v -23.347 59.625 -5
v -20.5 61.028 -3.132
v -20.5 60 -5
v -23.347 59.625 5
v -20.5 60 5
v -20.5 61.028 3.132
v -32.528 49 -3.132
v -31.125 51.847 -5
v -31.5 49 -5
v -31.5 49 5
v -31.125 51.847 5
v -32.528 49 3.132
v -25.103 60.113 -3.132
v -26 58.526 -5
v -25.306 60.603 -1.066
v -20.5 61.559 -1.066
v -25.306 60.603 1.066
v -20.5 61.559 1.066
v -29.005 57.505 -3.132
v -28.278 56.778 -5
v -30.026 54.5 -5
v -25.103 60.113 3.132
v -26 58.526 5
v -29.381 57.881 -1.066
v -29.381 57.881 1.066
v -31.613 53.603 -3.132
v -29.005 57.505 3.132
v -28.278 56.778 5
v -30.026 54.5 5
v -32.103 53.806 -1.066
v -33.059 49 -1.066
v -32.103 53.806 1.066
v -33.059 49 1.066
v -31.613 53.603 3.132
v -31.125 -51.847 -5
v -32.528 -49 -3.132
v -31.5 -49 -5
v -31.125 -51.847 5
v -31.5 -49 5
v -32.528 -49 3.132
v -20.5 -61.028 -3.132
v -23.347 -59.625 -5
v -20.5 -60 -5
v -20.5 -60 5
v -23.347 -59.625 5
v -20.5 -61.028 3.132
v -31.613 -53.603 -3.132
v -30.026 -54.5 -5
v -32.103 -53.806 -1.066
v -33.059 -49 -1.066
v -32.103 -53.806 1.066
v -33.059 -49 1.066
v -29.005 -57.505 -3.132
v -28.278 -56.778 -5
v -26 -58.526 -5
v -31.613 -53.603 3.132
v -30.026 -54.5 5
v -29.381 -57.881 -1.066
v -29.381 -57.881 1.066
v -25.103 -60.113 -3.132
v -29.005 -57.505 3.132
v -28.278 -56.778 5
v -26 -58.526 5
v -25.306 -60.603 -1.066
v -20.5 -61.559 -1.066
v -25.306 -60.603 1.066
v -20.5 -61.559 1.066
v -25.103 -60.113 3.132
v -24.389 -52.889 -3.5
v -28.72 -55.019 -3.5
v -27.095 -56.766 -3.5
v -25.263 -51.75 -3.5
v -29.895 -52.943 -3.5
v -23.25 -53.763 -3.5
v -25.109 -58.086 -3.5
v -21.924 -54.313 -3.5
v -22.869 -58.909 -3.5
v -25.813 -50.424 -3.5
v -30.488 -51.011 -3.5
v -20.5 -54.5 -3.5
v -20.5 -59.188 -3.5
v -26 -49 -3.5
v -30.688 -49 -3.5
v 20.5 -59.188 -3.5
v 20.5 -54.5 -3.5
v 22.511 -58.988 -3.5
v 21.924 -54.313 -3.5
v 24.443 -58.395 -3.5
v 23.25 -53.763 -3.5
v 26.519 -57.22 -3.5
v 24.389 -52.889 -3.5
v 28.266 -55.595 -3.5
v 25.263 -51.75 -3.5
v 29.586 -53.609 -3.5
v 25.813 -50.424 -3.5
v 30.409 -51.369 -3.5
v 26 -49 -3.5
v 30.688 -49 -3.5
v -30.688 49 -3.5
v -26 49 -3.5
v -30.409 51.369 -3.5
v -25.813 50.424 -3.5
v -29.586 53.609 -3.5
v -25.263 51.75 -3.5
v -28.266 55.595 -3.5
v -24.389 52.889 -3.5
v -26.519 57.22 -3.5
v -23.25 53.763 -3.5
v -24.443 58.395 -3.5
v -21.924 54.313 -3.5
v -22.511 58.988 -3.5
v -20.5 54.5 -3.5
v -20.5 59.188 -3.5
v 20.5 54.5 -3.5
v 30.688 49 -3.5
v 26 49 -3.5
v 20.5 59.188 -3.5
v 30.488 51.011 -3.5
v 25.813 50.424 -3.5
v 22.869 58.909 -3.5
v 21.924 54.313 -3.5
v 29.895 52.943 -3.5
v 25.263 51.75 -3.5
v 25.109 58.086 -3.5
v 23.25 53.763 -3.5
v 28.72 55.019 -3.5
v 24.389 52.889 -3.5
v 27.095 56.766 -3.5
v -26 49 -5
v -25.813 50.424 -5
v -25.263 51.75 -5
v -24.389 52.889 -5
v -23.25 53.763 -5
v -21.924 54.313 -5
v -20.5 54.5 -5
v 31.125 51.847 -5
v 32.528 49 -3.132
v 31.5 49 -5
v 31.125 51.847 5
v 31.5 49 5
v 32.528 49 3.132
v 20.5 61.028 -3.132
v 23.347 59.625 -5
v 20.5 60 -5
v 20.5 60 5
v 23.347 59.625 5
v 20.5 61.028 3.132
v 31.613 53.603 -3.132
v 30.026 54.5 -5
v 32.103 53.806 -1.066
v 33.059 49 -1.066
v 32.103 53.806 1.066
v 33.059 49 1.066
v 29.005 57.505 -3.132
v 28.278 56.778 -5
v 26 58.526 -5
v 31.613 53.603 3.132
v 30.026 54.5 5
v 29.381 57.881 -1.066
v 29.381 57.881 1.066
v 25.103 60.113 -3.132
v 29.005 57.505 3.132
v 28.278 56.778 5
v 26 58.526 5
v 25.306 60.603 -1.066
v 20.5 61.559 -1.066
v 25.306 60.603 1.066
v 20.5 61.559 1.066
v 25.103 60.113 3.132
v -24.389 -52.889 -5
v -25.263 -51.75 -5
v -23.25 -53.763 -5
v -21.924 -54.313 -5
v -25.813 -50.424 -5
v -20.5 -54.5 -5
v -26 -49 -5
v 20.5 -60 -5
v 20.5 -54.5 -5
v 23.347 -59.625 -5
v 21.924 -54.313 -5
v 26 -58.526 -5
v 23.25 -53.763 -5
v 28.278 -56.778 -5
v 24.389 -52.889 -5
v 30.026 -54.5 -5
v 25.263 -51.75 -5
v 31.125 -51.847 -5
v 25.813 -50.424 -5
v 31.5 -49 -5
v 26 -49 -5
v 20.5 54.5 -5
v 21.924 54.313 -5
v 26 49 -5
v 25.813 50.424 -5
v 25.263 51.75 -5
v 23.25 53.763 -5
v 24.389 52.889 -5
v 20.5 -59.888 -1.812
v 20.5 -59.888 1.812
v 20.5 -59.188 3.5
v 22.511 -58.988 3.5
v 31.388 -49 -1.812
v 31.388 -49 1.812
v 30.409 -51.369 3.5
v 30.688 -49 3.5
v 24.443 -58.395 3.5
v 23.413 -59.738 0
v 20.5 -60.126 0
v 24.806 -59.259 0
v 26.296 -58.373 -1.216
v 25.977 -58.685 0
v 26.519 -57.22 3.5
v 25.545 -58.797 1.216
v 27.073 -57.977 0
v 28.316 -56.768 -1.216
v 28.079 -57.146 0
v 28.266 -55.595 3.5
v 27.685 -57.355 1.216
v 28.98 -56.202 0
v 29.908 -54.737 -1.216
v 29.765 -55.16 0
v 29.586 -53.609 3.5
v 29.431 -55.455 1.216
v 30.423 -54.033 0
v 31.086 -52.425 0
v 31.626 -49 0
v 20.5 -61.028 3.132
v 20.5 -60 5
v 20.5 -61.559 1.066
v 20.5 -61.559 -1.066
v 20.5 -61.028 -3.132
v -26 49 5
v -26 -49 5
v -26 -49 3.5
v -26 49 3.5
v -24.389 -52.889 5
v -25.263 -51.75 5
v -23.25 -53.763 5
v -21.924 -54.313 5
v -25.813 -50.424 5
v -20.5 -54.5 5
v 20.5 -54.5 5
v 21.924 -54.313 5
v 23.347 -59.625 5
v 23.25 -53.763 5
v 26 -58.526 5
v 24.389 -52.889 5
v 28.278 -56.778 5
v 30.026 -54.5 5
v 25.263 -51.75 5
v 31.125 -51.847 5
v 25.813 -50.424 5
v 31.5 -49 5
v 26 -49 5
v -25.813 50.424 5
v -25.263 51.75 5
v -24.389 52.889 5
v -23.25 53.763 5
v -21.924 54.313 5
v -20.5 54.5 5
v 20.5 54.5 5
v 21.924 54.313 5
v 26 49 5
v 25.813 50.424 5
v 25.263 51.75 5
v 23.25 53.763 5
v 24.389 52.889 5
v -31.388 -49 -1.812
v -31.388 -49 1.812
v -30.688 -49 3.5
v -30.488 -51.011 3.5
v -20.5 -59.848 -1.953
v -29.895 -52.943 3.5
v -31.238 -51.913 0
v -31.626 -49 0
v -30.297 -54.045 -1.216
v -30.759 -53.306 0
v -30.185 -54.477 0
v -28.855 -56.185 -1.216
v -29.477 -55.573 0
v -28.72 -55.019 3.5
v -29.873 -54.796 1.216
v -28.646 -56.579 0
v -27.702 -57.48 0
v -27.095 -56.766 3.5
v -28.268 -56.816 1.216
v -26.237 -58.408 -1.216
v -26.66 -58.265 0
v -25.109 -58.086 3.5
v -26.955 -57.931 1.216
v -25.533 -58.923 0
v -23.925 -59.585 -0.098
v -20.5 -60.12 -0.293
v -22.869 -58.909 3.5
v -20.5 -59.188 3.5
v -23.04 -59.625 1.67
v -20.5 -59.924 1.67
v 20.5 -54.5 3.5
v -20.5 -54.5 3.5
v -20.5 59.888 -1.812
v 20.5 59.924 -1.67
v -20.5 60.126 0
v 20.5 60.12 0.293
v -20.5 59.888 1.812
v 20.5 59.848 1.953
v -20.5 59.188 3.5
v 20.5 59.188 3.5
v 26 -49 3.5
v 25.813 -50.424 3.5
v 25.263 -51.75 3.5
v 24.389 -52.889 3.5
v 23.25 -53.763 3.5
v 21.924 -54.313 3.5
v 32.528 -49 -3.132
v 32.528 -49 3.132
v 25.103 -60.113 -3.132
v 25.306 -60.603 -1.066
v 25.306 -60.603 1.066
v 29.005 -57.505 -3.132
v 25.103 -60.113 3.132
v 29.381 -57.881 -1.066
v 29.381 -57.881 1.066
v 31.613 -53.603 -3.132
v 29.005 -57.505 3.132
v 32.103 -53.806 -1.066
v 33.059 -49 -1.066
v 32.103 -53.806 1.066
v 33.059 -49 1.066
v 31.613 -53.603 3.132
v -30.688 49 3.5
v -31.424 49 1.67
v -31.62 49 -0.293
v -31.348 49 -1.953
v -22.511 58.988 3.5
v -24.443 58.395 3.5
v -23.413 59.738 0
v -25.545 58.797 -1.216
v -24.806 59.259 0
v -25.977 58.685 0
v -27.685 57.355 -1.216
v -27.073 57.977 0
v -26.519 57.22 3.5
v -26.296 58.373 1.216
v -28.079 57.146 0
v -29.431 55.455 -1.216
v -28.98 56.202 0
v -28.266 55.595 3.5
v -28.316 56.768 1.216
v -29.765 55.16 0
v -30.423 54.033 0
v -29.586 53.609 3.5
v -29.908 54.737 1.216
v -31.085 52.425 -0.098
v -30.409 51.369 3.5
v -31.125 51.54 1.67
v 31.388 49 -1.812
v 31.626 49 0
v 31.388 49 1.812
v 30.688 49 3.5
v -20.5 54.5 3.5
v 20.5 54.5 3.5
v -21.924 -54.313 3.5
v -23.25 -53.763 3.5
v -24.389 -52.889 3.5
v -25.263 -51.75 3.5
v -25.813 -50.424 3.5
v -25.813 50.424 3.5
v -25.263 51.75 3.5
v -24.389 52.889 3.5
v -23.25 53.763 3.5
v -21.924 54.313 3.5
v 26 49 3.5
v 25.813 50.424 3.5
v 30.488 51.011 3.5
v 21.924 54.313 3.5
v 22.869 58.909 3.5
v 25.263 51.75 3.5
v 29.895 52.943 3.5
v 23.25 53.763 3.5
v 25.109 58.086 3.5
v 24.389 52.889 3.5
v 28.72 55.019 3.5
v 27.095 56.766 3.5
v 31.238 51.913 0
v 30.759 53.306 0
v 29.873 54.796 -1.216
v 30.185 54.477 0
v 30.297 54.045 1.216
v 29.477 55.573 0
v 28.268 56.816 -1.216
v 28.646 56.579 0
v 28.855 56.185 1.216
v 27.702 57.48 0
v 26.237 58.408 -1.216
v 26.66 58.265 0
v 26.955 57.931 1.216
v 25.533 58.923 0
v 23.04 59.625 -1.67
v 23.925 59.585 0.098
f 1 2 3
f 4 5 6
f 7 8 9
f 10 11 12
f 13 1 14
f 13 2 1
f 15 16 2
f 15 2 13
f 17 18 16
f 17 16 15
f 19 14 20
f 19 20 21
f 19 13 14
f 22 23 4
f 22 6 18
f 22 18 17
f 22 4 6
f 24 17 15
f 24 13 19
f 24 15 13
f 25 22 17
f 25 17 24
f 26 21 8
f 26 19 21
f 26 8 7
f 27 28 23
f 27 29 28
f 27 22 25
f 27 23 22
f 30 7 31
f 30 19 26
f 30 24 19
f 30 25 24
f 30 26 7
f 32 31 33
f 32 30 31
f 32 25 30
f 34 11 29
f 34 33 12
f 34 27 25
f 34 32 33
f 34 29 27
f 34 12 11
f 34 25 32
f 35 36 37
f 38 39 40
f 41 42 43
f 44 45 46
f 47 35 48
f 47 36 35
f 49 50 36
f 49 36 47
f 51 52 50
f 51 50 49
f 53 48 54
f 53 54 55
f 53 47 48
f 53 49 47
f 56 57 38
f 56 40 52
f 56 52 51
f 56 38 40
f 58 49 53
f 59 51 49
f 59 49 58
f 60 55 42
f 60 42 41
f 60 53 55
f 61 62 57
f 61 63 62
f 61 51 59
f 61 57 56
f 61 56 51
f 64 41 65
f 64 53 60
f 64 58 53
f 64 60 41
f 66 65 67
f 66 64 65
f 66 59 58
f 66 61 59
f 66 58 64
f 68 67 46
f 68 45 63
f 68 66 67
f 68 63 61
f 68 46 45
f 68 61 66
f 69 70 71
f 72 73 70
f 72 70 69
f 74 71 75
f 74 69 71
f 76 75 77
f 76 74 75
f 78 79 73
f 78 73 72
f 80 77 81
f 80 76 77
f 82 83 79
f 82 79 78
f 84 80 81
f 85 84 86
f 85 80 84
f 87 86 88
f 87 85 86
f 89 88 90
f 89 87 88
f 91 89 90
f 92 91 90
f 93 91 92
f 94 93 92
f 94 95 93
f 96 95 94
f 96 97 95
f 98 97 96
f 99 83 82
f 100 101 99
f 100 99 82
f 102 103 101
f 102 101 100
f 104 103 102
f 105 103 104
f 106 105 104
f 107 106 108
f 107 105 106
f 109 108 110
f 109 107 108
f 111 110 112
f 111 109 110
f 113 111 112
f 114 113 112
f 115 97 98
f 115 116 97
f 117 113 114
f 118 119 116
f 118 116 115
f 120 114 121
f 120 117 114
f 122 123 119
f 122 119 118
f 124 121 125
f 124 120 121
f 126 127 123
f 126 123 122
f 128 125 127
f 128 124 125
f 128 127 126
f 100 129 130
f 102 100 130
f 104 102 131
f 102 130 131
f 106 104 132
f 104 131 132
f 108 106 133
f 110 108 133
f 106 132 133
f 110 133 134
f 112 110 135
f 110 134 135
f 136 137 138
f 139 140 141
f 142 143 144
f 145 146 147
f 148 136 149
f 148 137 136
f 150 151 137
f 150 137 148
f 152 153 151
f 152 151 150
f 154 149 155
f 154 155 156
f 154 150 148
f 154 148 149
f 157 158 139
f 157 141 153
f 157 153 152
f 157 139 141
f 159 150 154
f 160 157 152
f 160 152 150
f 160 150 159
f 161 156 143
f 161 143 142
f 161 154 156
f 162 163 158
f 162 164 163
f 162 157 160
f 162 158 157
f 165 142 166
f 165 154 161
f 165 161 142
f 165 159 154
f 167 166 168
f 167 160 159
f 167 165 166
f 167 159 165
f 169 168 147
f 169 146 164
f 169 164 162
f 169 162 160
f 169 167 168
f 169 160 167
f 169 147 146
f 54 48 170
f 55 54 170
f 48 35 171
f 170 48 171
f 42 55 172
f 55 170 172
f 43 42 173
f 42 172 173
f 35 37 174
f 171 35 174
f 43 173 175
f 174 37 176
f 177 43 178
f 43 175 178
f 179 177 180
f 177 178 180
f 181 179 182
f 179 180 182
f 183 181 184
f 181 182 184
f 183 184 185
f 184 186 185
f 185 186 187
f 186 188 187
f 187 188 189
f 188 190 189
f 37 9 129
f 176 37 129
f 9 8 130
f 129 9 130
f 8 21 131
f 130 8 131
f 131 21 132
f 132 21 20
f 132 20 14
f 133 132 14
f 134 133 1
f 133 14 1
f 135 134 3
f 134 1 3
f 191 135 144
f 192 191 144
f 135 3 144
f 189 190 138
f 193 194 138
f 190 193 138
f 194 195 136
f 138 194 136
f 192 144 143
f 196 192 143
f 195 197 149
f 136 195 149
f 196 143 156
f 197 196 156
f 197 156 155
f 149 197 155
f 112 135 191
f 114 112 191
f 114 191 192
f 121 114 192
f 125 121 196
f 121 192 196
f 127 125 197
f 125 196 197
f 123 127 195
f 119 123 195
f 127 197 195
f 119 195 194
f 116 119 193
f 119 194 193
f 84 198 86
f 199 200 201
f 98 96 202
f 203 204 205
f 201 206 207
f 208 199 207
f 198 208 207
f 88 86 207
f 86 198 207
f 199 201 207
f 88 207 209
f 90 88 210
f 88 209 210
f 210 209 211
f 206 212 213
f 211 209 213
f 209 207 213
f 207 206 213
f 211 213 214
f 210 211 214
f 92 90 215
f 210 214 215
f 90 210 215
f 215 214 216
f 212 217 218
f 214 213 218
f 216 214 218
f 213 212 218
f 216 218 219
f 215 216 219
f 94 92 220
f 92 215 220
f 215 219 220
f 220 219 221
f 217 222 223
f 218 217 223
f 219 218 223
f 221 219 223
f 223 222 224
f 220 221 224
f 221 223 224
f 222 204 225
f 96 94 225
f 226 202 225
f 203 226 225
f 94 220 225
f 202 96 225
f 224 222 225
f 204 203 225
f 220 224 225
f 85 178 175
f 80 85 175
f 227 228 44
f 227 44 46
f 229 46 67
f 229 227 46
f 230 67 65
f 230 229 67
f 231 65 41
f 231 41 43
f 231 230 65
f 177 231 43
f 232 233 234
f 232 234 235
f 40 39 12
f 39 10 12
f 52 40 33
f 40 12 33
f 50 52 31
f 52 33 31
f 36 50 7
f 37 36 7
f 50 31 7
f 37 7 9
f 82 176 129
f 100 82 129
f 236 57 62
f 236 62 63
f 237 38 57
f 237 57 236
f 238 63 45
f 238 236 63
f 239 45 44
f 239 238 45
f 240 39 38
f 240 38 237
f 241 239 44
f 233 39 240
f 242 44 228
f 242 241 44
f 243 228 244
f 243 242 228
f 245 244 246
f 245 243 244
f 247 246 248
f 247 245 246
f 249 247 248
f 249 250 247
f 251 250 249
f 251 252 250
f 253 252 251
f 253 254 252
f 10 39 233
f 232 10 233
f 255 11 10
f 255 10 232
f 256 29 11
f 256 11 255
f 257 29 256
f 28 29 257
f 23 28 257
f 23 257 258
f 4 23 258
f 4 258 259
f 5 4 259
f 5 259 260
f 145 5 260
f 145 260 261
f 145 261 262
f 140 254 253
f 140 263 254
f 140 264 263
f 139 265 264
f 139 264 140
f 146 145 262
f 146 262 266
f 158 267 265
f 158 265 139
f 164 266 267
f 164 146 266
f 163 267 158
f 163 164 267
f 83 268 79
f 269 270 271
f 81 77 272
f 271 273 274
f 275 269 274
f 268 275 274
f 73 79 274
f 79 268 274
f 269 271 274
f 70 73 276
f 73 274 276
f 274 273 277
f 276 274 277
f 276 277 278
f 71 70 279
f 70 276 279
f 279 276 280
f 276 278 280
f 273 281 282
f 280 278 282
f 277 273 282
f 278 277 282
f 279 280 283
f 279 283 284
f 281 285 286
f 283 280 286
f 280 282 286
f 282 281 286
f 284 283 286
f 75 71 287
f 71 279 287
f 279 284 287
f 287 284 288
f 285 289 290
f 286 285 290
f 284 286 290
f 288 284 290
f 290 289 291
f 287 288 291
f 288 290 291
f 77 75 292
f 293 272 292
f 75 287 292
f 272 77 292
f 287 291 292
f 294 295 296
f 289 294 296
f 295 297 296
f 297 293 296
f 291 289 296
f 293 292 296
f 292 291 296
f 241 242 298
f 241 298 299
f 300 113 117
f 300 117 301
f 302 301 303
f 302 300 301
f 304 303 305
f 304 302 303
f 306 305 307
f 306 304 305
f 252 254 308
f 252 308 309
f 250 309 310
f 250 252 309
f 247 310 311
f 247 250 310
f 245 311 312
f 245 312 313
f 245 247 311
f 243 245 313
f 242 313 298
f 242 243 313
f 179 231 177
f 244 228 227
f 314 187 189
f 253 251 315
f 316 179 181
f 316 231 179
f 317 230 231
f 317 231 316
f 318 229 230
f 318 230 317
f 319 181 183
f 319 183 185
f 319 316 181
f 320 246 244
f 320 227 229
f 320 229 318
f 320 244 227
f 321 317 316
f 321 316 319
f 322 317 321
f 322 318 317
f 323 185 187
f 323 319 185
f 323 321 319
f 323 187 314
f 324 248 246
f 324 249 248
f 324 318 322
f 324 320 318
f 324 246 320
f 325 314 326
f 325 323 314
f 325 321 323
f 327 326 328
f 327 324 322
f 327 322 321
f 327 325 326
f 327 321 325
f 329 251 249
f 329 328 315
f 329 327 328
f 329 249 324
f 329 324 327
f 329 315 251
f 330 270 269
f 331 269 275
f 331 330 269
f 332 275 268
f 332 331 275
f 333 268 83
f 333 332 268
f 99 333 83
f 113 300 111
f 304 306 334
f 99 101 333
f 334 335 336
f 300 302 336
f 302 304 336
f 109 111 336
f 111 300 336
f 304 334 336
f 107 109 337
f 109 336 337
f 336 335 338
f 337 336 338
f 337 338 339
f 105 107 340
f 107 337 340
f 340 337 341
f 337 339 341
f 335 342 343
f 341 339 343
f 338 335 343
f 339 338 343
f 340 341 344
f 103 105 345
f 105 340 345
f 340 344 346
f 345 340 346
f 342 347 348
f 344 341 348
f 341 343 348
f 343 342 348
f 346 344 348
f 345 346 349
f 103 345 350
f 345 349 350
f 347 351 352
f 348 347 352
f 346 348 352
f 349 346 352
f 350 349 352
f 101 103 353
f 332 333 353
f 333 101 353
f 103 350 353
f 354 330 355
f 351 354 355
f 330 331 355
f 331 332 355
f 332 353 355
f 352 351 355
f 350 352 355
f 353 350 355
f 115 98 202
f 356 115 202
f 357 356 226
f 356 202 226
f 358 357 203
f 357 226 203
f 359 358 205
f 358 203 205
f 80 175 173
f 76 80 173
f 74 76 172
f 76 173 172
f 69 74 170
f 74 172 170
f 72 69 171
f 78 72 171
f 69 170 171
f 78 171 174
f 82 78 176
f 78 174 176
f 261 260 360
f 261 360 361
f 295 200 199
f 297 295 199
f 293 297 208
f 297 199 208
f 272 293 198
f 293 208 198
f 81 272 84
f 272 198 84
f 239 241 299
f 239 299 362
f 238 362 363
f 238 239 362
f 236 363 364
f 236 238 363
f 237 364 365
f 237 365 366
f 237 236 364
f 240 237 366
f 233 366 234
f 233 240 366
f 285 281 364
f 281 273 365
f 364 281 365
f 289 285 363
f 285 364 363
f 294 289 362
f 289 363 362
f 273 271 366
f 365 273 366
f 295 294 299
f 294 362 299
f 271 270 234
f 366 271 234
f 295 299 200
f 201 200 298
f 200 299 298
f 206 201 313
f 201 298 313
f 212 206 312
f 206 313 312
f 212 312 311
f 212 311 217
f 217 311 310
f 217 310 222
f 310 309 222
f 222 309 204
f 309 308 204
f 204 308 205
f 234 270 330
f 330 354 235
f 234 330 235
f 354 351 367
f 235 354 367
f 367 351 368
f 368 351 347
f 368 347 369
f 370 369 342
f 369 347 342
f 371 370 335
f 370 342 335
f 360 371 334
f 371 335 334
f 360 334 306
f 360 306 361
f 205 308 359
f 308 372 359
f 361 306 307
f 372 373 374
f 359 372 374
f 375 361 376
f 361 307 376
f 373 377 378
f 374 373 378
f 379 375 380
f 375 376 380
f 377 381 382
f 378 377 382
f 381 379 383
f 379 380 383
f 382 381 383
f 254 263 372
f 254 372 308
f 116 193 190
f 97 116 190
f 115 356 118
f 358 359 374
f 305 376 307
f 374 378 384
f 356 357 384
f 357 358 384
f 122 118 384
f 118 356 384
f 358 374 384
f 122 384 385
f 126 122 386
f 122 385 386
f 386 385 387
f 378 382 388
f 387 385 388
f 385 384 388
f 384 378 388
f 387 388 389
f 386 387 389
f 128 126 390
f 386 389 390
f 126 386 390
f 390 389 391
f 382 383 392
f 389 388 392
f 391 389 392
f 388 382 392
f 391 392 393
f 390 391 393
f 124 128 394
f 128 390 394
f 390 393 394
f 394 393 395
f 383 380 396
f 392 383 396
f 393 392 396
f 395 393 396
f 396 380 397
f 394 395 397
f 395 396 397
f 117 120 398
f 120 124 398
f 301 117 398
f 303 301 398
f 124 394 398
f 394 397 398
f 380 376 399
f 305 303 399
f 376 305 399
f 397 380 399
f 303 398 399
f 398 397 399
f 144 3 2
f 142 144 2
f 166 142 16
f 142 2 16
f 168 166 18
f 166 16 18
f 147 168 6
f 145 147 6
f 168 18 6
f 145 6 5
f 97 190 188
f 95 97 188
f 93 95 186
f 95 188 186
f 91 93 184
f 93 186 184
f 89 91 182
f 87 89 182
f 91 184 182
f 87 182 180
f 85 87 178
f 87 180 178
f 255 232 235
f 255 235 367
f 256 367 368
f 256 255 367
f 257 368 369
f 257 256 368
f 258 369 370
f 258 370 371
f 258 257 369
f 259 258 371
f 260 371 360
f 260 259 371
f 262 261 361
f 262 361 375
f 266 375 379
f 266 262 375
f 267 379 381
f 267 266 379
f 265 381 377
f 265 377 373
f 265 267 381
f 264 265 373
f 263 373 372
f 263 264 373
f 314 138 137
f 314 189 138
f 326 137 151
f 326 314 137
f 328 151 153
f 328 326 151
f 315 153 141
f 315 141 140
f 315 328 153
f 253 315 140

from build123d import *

# Parameters (mm, degrees)
F1_DEPTH  = 5
F3_DEPTH  = 49
F5_DEPTH  = 20.5
F15_DEPTH = 1.5
F17_T     = 1.5


# Not quite as in the source:
# - a shell that OpenCascade refuses in one call is made with other operations: the cavity is built on its own and cut out


with BuildPart() as f1:
    # F0 (on Top) → F1 (new body, symmetric)
    with BuildSketch(Plane.XY):
        with BuildLine():
            Line((31.5, -49), (31.5, 49))
            ThreePointArc((31.5, 49), (28.2781745931, 56.7781745931), (20.5, 60))
            Line((20.5, 60), (-20.5, 60))
            ThreePointArc((-20.5, 60), (-28.2781745931, 56.7781745931), (-31.5, 49))
            Line((-31.5, 49), (-31.5, -49))
            ThreePointArc((-31.5, -49), (-28.2781745931, -56.7781745931), (-20.5, -60))
            Line((-20.5, -60), (20.5, -60))
            ThreePointArc((20.5, -60), (28.2781745931, -56.7781745931), (31.5, -49))
        make_face()
        with BuildLine():
            ThreePointArc((-29.5, 49), (-26.8639610307, 55.3639610307), (-20.5, 58))
            Line((-20.5, 58), (20.5, 58))
            ThreePointArc((20.5, 58), (26.8639610307, 55.3639610307), (29.5, 49))
            Line((29.5, 49), (29.5, -49))
            ThreePointArc((29.5, -49), (26.8639610307, -55.3639610307), (20.5, -58))
            Line((20.5, -58), (-20.5, -58))
            ThreePointArc((-20.5, -58), (-26.8639610307, -55.3639610307), (-29.5, -49))
            Line((-29.5, -49), (-29.5, 49))
        make_face(mode=Mode.SUBTRACT)
    extrude(amount=F1_DEPTH, both=True)

    # F2 (on Front) → F3 (join, symmetric)
    with BuildSketch(Plane.XZ):
        with BuildLine():
            Line((-31.5, -5), (-31.5, 5))
            ThreePointArc((-31.5, 5), (-33.1261364576, 0), (-31.5, -5))
        make_face()
        with BuildLine():
            ThreePointArc((31.5, -5), (33.1261364576, 0), (31.5, 5))
            Line((31.5, 5), (31.5, -5))
        make_face()
    extrude(amount=F3_DEPTH, both=True)

    # F4 (on Right) → F5 (join, symmetric)
    with BuildSketch(Plane.YZ):
        with BuildLine():
            ThreePointArc((60, -5), (61.6261364576, 0), (60, 5))
            Line((60, 5), (60, -5))
        make_face()
        with BuildLine():
            Line((-60, -5), (-60, 5))
            ThreePointArc((-60, 5), (-61.6261364576, 0), (-60, -5))
        make_face()
    extrude(amount=F5_DEPTH, both=True)

    # F7: sweep along a path in F0
    with BuildLine(Plane.XY) as f7_path:
        ThreePointArc((-20.5, 62), (-29.6923881554, 58.1923881554), (-33.5, 49))
    # F6 (on face) → F7 (sweep)
    with BuildSketch(Plane(origin=(-20.5, 0, 0), x_dir=(0, -1, 0), z_dir=(-1, 0, 0))):
        with BuildLine():
            ThreePointArc((-60, 5), (-61.6261364576, 0), (-60, -5))
            Line((-60, -5), (-60, 5))
        make_face()
    sweep(path=f7_path.line)

    # F9: sweep along a path in F0
    with BuildLine(Plane.XY) as f9_path:
        ThreePointArc((33.5, 49), (29.6923881554, 58.1923881554), (20.5, 62))
    # F8 (on face) → F9 (sweep)
    with BuildSketch(Plane.YZ.offset(20.5)):
        with BuildLine():
            Line((60, 5), (60, -5))
            ThreePointArc((60, -5), (61.6261364576, 0), (60, 5))
        make_face()
    sweep(path=f9_path.line)

    # F11: sweep along a path in F0
    with BuildLine(Plane.XY) as f11_path:
        ThreePointArc((20.5, -62), (29.6923881554, -58.1923881554), (33.5, -49))
    # F10 (on face) → F11 (sweep)
    with BuildSketch(Plane.YZ.offset(20.5)):
        with BuildLine():
            Line((-60, -5), (-60, 5))
            ThreePointArc((-60, 5), (-61.6261364576, 0), (-60, -5))
        make_face()
    sweep(path=f11_path.line)

    # F13: sweep along a path in F0
    with BuildLine(Plane.XY) as f13_path:
        ThreePointArc((-33.5, -49), (-29.6923881554, -58.1923881554), (-20.5, -62))
    # F12 (on face) → F13 (sweep)
    with BuildSketch(Plane(origin=(-20.5, 0, 0), x_dir=(0, -1, 0), z_dir=(-1, 0, 0))):
        with BuildLine():
            ThreePointArc((60, -5), (61.6261364576, 0), (60, 5))
            Line((60, 5), (60, -5))
        make_face()
    sweep(path=f13_path.line)

    # F14 (on face) → F15 (join)
    with BuildSketch(Plane.XY.offset(5)):
        with BuildLine():
            Line((20.5, 60), (-20.5, 60))
            ThreePointArc((-20.5, 60), (-28.2781745931, 56.7781745931), (-31.5, 49))
            Line((-31.5, 49), (-31.5, -49))
            ThreePointArc((-31.5, -49), (-28.2781745931, -56.7781745931), (-20.5, -60))
            Line((-20.5, -60), (20.5, -60))
            ThreePointArc((20.5, -60), (28.2781745931, -56.7781745931), (31.5, -49))
            Line((31.5, -49), (31.5, 49))
            ThreePointArc((31.5, 49), (28.2781745931, 56.7781745931), (20.5, 60))
        make_face()
        with BuildLine():
            Line((-29.5, -49), (-29.5, 49))
            ThreePointArc((-29.5, 49), (-26.8639610307, 55.3639610307), (-20.5, 58))
            Line((-20.5, 58), (20.5, 58))
            ThreePointArc((20.5, 58), (26.8639610307, 55.3639610307), (29.5, 49))
            Line((29.5, 49), (29.5, -49))
            ThreePointArc((29.5, -49), (26.8639610307, -55.3639610307), (20.5, -58))
            Line((20.5, -58), (-20.5, -58))
            ThreePointArc((-20.5, -58), (-26.8639610307, -55.3639610307), (-29.5, -49))
        make_face(mode=Mode.SUBTRACT)
        with BuildLine():
            ThreePointArc((-20.5, 58), (-26.8639610307, 55.3639610307), (-29.5, 49))
            Line((-29.5, 49), (-29.5, -49))
            ThreePointArc((-29.5, -49), (-26.8639610307, -55.3639610307), (-20.5, -58))
            Line((-20.5, -58), (20.5, -58))
            ThreePointArc((20.5, -58), (26.8639610307, -55.3639610307), (29.5, -49))
            Line((29.5, -49), (29.5, 49))
            ThreePointArc((29.5, 49), (26.8639610307, 55.3639610307), (20.5, 58))
            Line((20.5, 58), (-20.5, 58))
        make_face()
        with BuildLine():
            ThreePointArc((-26, 49), (-24.3890872965, 52.8890872965), (-20.5, 54.5))
            Line((-20.5, 54.5), (20.5, 54.5))
            ThreePointArc((20.5, 54.5), (24.3890872965, 52.8890872965), (26, 49))
            Line((26, 49), (26, -49))
            ThreePointArc((26, -49), (24.3890872965, -52.8890872965), (20.5, -54.5))
            Line((20.5, -54.5), (-20.5, -54.5))
            ThreePointArc((-20.5, -54.5), (-24.3890872965, -52.8890872965), (-26, -49))
            Line((-26, -49), (-26, 49))
        make_face(mode=Mode.SUBTRACT)
    extrude(amount=-F15_DEPTH)

    # F16: F1 across plane


with BuildPart() as f1_1:
    add(f1.part)
    add(f1.part.mirror(Plane.XY))

    # F17: shell of thickness 1.5, made by hand


with BuildPart() as f17_core1:
    # F17_t2: copy of F1
    add(f1_1.part)

    # the walls: a layer under each face that stays
    f17_faces = [f17_core1.faces().sort_by_distance(p)[0] for p in [
        (-27, -51.4285714286, -5),
        (33.1261364576, 0, 0),
        (29.4280267093, 57.9280267093, 0),
        (0, 61.6261364576, 0),
        (-29.4280267093, 57.9280267093, 0),
        (-33.1261364576, 0, 0),
        (-29.4280267093, -57.9280267093, 0),
        (0, -61.6261364576, 0),
        (29.4280267093, -57.9280267093, 0),
        (-27, -51.4285714286, 5),
        (24.3890872965, -52.8890872965, -4.25),
        (26, 0, -4.25),
        (0, -54.5, -4.25),
        (24.3890872965, 52.8890872965, -4.25),
        (-24.3890872965, -52.8890872965, -4.25),
        (0, 54.5, -4.25),
        (-26, 0, -4.25),
        (-24.3890872965, 52.8890872965, -4.25),
        (-27.5333333333, -54.1333333333, -3.5),
        (24.3890872965, -52.8890872965, 4.25),
        (26, 0, 4.25),
        (0, -54.5, 4.25),
        (24.3890872965, 52.8890872965, 4.25),
        (-24.3890872965, -52.8890872965, 4.25),
        (0, 54.5, 4.25),
        (-26, 0, 4.25),
        (-24.3890872965, 52.8890872965, 4.25),
        (-27.5333333333, -54.1333333333, 3.5),
    ]]
    thicken(f17_faces, amount=-F17_T, mode=Mode.SUBTRACT)


with BuildPart() as f1_2:
    add(f1_1.part)

    # what is left inside the walls is the cavity
    f17_cavity = [f17_core1.part.solids().sort_by_distance(p)[0] for p in [
        (-31.611136, 16.333334, 0),
    ]]
    add(f17_cavity, mode=Mode.SUBTRACT)


solid = f1_2.part
